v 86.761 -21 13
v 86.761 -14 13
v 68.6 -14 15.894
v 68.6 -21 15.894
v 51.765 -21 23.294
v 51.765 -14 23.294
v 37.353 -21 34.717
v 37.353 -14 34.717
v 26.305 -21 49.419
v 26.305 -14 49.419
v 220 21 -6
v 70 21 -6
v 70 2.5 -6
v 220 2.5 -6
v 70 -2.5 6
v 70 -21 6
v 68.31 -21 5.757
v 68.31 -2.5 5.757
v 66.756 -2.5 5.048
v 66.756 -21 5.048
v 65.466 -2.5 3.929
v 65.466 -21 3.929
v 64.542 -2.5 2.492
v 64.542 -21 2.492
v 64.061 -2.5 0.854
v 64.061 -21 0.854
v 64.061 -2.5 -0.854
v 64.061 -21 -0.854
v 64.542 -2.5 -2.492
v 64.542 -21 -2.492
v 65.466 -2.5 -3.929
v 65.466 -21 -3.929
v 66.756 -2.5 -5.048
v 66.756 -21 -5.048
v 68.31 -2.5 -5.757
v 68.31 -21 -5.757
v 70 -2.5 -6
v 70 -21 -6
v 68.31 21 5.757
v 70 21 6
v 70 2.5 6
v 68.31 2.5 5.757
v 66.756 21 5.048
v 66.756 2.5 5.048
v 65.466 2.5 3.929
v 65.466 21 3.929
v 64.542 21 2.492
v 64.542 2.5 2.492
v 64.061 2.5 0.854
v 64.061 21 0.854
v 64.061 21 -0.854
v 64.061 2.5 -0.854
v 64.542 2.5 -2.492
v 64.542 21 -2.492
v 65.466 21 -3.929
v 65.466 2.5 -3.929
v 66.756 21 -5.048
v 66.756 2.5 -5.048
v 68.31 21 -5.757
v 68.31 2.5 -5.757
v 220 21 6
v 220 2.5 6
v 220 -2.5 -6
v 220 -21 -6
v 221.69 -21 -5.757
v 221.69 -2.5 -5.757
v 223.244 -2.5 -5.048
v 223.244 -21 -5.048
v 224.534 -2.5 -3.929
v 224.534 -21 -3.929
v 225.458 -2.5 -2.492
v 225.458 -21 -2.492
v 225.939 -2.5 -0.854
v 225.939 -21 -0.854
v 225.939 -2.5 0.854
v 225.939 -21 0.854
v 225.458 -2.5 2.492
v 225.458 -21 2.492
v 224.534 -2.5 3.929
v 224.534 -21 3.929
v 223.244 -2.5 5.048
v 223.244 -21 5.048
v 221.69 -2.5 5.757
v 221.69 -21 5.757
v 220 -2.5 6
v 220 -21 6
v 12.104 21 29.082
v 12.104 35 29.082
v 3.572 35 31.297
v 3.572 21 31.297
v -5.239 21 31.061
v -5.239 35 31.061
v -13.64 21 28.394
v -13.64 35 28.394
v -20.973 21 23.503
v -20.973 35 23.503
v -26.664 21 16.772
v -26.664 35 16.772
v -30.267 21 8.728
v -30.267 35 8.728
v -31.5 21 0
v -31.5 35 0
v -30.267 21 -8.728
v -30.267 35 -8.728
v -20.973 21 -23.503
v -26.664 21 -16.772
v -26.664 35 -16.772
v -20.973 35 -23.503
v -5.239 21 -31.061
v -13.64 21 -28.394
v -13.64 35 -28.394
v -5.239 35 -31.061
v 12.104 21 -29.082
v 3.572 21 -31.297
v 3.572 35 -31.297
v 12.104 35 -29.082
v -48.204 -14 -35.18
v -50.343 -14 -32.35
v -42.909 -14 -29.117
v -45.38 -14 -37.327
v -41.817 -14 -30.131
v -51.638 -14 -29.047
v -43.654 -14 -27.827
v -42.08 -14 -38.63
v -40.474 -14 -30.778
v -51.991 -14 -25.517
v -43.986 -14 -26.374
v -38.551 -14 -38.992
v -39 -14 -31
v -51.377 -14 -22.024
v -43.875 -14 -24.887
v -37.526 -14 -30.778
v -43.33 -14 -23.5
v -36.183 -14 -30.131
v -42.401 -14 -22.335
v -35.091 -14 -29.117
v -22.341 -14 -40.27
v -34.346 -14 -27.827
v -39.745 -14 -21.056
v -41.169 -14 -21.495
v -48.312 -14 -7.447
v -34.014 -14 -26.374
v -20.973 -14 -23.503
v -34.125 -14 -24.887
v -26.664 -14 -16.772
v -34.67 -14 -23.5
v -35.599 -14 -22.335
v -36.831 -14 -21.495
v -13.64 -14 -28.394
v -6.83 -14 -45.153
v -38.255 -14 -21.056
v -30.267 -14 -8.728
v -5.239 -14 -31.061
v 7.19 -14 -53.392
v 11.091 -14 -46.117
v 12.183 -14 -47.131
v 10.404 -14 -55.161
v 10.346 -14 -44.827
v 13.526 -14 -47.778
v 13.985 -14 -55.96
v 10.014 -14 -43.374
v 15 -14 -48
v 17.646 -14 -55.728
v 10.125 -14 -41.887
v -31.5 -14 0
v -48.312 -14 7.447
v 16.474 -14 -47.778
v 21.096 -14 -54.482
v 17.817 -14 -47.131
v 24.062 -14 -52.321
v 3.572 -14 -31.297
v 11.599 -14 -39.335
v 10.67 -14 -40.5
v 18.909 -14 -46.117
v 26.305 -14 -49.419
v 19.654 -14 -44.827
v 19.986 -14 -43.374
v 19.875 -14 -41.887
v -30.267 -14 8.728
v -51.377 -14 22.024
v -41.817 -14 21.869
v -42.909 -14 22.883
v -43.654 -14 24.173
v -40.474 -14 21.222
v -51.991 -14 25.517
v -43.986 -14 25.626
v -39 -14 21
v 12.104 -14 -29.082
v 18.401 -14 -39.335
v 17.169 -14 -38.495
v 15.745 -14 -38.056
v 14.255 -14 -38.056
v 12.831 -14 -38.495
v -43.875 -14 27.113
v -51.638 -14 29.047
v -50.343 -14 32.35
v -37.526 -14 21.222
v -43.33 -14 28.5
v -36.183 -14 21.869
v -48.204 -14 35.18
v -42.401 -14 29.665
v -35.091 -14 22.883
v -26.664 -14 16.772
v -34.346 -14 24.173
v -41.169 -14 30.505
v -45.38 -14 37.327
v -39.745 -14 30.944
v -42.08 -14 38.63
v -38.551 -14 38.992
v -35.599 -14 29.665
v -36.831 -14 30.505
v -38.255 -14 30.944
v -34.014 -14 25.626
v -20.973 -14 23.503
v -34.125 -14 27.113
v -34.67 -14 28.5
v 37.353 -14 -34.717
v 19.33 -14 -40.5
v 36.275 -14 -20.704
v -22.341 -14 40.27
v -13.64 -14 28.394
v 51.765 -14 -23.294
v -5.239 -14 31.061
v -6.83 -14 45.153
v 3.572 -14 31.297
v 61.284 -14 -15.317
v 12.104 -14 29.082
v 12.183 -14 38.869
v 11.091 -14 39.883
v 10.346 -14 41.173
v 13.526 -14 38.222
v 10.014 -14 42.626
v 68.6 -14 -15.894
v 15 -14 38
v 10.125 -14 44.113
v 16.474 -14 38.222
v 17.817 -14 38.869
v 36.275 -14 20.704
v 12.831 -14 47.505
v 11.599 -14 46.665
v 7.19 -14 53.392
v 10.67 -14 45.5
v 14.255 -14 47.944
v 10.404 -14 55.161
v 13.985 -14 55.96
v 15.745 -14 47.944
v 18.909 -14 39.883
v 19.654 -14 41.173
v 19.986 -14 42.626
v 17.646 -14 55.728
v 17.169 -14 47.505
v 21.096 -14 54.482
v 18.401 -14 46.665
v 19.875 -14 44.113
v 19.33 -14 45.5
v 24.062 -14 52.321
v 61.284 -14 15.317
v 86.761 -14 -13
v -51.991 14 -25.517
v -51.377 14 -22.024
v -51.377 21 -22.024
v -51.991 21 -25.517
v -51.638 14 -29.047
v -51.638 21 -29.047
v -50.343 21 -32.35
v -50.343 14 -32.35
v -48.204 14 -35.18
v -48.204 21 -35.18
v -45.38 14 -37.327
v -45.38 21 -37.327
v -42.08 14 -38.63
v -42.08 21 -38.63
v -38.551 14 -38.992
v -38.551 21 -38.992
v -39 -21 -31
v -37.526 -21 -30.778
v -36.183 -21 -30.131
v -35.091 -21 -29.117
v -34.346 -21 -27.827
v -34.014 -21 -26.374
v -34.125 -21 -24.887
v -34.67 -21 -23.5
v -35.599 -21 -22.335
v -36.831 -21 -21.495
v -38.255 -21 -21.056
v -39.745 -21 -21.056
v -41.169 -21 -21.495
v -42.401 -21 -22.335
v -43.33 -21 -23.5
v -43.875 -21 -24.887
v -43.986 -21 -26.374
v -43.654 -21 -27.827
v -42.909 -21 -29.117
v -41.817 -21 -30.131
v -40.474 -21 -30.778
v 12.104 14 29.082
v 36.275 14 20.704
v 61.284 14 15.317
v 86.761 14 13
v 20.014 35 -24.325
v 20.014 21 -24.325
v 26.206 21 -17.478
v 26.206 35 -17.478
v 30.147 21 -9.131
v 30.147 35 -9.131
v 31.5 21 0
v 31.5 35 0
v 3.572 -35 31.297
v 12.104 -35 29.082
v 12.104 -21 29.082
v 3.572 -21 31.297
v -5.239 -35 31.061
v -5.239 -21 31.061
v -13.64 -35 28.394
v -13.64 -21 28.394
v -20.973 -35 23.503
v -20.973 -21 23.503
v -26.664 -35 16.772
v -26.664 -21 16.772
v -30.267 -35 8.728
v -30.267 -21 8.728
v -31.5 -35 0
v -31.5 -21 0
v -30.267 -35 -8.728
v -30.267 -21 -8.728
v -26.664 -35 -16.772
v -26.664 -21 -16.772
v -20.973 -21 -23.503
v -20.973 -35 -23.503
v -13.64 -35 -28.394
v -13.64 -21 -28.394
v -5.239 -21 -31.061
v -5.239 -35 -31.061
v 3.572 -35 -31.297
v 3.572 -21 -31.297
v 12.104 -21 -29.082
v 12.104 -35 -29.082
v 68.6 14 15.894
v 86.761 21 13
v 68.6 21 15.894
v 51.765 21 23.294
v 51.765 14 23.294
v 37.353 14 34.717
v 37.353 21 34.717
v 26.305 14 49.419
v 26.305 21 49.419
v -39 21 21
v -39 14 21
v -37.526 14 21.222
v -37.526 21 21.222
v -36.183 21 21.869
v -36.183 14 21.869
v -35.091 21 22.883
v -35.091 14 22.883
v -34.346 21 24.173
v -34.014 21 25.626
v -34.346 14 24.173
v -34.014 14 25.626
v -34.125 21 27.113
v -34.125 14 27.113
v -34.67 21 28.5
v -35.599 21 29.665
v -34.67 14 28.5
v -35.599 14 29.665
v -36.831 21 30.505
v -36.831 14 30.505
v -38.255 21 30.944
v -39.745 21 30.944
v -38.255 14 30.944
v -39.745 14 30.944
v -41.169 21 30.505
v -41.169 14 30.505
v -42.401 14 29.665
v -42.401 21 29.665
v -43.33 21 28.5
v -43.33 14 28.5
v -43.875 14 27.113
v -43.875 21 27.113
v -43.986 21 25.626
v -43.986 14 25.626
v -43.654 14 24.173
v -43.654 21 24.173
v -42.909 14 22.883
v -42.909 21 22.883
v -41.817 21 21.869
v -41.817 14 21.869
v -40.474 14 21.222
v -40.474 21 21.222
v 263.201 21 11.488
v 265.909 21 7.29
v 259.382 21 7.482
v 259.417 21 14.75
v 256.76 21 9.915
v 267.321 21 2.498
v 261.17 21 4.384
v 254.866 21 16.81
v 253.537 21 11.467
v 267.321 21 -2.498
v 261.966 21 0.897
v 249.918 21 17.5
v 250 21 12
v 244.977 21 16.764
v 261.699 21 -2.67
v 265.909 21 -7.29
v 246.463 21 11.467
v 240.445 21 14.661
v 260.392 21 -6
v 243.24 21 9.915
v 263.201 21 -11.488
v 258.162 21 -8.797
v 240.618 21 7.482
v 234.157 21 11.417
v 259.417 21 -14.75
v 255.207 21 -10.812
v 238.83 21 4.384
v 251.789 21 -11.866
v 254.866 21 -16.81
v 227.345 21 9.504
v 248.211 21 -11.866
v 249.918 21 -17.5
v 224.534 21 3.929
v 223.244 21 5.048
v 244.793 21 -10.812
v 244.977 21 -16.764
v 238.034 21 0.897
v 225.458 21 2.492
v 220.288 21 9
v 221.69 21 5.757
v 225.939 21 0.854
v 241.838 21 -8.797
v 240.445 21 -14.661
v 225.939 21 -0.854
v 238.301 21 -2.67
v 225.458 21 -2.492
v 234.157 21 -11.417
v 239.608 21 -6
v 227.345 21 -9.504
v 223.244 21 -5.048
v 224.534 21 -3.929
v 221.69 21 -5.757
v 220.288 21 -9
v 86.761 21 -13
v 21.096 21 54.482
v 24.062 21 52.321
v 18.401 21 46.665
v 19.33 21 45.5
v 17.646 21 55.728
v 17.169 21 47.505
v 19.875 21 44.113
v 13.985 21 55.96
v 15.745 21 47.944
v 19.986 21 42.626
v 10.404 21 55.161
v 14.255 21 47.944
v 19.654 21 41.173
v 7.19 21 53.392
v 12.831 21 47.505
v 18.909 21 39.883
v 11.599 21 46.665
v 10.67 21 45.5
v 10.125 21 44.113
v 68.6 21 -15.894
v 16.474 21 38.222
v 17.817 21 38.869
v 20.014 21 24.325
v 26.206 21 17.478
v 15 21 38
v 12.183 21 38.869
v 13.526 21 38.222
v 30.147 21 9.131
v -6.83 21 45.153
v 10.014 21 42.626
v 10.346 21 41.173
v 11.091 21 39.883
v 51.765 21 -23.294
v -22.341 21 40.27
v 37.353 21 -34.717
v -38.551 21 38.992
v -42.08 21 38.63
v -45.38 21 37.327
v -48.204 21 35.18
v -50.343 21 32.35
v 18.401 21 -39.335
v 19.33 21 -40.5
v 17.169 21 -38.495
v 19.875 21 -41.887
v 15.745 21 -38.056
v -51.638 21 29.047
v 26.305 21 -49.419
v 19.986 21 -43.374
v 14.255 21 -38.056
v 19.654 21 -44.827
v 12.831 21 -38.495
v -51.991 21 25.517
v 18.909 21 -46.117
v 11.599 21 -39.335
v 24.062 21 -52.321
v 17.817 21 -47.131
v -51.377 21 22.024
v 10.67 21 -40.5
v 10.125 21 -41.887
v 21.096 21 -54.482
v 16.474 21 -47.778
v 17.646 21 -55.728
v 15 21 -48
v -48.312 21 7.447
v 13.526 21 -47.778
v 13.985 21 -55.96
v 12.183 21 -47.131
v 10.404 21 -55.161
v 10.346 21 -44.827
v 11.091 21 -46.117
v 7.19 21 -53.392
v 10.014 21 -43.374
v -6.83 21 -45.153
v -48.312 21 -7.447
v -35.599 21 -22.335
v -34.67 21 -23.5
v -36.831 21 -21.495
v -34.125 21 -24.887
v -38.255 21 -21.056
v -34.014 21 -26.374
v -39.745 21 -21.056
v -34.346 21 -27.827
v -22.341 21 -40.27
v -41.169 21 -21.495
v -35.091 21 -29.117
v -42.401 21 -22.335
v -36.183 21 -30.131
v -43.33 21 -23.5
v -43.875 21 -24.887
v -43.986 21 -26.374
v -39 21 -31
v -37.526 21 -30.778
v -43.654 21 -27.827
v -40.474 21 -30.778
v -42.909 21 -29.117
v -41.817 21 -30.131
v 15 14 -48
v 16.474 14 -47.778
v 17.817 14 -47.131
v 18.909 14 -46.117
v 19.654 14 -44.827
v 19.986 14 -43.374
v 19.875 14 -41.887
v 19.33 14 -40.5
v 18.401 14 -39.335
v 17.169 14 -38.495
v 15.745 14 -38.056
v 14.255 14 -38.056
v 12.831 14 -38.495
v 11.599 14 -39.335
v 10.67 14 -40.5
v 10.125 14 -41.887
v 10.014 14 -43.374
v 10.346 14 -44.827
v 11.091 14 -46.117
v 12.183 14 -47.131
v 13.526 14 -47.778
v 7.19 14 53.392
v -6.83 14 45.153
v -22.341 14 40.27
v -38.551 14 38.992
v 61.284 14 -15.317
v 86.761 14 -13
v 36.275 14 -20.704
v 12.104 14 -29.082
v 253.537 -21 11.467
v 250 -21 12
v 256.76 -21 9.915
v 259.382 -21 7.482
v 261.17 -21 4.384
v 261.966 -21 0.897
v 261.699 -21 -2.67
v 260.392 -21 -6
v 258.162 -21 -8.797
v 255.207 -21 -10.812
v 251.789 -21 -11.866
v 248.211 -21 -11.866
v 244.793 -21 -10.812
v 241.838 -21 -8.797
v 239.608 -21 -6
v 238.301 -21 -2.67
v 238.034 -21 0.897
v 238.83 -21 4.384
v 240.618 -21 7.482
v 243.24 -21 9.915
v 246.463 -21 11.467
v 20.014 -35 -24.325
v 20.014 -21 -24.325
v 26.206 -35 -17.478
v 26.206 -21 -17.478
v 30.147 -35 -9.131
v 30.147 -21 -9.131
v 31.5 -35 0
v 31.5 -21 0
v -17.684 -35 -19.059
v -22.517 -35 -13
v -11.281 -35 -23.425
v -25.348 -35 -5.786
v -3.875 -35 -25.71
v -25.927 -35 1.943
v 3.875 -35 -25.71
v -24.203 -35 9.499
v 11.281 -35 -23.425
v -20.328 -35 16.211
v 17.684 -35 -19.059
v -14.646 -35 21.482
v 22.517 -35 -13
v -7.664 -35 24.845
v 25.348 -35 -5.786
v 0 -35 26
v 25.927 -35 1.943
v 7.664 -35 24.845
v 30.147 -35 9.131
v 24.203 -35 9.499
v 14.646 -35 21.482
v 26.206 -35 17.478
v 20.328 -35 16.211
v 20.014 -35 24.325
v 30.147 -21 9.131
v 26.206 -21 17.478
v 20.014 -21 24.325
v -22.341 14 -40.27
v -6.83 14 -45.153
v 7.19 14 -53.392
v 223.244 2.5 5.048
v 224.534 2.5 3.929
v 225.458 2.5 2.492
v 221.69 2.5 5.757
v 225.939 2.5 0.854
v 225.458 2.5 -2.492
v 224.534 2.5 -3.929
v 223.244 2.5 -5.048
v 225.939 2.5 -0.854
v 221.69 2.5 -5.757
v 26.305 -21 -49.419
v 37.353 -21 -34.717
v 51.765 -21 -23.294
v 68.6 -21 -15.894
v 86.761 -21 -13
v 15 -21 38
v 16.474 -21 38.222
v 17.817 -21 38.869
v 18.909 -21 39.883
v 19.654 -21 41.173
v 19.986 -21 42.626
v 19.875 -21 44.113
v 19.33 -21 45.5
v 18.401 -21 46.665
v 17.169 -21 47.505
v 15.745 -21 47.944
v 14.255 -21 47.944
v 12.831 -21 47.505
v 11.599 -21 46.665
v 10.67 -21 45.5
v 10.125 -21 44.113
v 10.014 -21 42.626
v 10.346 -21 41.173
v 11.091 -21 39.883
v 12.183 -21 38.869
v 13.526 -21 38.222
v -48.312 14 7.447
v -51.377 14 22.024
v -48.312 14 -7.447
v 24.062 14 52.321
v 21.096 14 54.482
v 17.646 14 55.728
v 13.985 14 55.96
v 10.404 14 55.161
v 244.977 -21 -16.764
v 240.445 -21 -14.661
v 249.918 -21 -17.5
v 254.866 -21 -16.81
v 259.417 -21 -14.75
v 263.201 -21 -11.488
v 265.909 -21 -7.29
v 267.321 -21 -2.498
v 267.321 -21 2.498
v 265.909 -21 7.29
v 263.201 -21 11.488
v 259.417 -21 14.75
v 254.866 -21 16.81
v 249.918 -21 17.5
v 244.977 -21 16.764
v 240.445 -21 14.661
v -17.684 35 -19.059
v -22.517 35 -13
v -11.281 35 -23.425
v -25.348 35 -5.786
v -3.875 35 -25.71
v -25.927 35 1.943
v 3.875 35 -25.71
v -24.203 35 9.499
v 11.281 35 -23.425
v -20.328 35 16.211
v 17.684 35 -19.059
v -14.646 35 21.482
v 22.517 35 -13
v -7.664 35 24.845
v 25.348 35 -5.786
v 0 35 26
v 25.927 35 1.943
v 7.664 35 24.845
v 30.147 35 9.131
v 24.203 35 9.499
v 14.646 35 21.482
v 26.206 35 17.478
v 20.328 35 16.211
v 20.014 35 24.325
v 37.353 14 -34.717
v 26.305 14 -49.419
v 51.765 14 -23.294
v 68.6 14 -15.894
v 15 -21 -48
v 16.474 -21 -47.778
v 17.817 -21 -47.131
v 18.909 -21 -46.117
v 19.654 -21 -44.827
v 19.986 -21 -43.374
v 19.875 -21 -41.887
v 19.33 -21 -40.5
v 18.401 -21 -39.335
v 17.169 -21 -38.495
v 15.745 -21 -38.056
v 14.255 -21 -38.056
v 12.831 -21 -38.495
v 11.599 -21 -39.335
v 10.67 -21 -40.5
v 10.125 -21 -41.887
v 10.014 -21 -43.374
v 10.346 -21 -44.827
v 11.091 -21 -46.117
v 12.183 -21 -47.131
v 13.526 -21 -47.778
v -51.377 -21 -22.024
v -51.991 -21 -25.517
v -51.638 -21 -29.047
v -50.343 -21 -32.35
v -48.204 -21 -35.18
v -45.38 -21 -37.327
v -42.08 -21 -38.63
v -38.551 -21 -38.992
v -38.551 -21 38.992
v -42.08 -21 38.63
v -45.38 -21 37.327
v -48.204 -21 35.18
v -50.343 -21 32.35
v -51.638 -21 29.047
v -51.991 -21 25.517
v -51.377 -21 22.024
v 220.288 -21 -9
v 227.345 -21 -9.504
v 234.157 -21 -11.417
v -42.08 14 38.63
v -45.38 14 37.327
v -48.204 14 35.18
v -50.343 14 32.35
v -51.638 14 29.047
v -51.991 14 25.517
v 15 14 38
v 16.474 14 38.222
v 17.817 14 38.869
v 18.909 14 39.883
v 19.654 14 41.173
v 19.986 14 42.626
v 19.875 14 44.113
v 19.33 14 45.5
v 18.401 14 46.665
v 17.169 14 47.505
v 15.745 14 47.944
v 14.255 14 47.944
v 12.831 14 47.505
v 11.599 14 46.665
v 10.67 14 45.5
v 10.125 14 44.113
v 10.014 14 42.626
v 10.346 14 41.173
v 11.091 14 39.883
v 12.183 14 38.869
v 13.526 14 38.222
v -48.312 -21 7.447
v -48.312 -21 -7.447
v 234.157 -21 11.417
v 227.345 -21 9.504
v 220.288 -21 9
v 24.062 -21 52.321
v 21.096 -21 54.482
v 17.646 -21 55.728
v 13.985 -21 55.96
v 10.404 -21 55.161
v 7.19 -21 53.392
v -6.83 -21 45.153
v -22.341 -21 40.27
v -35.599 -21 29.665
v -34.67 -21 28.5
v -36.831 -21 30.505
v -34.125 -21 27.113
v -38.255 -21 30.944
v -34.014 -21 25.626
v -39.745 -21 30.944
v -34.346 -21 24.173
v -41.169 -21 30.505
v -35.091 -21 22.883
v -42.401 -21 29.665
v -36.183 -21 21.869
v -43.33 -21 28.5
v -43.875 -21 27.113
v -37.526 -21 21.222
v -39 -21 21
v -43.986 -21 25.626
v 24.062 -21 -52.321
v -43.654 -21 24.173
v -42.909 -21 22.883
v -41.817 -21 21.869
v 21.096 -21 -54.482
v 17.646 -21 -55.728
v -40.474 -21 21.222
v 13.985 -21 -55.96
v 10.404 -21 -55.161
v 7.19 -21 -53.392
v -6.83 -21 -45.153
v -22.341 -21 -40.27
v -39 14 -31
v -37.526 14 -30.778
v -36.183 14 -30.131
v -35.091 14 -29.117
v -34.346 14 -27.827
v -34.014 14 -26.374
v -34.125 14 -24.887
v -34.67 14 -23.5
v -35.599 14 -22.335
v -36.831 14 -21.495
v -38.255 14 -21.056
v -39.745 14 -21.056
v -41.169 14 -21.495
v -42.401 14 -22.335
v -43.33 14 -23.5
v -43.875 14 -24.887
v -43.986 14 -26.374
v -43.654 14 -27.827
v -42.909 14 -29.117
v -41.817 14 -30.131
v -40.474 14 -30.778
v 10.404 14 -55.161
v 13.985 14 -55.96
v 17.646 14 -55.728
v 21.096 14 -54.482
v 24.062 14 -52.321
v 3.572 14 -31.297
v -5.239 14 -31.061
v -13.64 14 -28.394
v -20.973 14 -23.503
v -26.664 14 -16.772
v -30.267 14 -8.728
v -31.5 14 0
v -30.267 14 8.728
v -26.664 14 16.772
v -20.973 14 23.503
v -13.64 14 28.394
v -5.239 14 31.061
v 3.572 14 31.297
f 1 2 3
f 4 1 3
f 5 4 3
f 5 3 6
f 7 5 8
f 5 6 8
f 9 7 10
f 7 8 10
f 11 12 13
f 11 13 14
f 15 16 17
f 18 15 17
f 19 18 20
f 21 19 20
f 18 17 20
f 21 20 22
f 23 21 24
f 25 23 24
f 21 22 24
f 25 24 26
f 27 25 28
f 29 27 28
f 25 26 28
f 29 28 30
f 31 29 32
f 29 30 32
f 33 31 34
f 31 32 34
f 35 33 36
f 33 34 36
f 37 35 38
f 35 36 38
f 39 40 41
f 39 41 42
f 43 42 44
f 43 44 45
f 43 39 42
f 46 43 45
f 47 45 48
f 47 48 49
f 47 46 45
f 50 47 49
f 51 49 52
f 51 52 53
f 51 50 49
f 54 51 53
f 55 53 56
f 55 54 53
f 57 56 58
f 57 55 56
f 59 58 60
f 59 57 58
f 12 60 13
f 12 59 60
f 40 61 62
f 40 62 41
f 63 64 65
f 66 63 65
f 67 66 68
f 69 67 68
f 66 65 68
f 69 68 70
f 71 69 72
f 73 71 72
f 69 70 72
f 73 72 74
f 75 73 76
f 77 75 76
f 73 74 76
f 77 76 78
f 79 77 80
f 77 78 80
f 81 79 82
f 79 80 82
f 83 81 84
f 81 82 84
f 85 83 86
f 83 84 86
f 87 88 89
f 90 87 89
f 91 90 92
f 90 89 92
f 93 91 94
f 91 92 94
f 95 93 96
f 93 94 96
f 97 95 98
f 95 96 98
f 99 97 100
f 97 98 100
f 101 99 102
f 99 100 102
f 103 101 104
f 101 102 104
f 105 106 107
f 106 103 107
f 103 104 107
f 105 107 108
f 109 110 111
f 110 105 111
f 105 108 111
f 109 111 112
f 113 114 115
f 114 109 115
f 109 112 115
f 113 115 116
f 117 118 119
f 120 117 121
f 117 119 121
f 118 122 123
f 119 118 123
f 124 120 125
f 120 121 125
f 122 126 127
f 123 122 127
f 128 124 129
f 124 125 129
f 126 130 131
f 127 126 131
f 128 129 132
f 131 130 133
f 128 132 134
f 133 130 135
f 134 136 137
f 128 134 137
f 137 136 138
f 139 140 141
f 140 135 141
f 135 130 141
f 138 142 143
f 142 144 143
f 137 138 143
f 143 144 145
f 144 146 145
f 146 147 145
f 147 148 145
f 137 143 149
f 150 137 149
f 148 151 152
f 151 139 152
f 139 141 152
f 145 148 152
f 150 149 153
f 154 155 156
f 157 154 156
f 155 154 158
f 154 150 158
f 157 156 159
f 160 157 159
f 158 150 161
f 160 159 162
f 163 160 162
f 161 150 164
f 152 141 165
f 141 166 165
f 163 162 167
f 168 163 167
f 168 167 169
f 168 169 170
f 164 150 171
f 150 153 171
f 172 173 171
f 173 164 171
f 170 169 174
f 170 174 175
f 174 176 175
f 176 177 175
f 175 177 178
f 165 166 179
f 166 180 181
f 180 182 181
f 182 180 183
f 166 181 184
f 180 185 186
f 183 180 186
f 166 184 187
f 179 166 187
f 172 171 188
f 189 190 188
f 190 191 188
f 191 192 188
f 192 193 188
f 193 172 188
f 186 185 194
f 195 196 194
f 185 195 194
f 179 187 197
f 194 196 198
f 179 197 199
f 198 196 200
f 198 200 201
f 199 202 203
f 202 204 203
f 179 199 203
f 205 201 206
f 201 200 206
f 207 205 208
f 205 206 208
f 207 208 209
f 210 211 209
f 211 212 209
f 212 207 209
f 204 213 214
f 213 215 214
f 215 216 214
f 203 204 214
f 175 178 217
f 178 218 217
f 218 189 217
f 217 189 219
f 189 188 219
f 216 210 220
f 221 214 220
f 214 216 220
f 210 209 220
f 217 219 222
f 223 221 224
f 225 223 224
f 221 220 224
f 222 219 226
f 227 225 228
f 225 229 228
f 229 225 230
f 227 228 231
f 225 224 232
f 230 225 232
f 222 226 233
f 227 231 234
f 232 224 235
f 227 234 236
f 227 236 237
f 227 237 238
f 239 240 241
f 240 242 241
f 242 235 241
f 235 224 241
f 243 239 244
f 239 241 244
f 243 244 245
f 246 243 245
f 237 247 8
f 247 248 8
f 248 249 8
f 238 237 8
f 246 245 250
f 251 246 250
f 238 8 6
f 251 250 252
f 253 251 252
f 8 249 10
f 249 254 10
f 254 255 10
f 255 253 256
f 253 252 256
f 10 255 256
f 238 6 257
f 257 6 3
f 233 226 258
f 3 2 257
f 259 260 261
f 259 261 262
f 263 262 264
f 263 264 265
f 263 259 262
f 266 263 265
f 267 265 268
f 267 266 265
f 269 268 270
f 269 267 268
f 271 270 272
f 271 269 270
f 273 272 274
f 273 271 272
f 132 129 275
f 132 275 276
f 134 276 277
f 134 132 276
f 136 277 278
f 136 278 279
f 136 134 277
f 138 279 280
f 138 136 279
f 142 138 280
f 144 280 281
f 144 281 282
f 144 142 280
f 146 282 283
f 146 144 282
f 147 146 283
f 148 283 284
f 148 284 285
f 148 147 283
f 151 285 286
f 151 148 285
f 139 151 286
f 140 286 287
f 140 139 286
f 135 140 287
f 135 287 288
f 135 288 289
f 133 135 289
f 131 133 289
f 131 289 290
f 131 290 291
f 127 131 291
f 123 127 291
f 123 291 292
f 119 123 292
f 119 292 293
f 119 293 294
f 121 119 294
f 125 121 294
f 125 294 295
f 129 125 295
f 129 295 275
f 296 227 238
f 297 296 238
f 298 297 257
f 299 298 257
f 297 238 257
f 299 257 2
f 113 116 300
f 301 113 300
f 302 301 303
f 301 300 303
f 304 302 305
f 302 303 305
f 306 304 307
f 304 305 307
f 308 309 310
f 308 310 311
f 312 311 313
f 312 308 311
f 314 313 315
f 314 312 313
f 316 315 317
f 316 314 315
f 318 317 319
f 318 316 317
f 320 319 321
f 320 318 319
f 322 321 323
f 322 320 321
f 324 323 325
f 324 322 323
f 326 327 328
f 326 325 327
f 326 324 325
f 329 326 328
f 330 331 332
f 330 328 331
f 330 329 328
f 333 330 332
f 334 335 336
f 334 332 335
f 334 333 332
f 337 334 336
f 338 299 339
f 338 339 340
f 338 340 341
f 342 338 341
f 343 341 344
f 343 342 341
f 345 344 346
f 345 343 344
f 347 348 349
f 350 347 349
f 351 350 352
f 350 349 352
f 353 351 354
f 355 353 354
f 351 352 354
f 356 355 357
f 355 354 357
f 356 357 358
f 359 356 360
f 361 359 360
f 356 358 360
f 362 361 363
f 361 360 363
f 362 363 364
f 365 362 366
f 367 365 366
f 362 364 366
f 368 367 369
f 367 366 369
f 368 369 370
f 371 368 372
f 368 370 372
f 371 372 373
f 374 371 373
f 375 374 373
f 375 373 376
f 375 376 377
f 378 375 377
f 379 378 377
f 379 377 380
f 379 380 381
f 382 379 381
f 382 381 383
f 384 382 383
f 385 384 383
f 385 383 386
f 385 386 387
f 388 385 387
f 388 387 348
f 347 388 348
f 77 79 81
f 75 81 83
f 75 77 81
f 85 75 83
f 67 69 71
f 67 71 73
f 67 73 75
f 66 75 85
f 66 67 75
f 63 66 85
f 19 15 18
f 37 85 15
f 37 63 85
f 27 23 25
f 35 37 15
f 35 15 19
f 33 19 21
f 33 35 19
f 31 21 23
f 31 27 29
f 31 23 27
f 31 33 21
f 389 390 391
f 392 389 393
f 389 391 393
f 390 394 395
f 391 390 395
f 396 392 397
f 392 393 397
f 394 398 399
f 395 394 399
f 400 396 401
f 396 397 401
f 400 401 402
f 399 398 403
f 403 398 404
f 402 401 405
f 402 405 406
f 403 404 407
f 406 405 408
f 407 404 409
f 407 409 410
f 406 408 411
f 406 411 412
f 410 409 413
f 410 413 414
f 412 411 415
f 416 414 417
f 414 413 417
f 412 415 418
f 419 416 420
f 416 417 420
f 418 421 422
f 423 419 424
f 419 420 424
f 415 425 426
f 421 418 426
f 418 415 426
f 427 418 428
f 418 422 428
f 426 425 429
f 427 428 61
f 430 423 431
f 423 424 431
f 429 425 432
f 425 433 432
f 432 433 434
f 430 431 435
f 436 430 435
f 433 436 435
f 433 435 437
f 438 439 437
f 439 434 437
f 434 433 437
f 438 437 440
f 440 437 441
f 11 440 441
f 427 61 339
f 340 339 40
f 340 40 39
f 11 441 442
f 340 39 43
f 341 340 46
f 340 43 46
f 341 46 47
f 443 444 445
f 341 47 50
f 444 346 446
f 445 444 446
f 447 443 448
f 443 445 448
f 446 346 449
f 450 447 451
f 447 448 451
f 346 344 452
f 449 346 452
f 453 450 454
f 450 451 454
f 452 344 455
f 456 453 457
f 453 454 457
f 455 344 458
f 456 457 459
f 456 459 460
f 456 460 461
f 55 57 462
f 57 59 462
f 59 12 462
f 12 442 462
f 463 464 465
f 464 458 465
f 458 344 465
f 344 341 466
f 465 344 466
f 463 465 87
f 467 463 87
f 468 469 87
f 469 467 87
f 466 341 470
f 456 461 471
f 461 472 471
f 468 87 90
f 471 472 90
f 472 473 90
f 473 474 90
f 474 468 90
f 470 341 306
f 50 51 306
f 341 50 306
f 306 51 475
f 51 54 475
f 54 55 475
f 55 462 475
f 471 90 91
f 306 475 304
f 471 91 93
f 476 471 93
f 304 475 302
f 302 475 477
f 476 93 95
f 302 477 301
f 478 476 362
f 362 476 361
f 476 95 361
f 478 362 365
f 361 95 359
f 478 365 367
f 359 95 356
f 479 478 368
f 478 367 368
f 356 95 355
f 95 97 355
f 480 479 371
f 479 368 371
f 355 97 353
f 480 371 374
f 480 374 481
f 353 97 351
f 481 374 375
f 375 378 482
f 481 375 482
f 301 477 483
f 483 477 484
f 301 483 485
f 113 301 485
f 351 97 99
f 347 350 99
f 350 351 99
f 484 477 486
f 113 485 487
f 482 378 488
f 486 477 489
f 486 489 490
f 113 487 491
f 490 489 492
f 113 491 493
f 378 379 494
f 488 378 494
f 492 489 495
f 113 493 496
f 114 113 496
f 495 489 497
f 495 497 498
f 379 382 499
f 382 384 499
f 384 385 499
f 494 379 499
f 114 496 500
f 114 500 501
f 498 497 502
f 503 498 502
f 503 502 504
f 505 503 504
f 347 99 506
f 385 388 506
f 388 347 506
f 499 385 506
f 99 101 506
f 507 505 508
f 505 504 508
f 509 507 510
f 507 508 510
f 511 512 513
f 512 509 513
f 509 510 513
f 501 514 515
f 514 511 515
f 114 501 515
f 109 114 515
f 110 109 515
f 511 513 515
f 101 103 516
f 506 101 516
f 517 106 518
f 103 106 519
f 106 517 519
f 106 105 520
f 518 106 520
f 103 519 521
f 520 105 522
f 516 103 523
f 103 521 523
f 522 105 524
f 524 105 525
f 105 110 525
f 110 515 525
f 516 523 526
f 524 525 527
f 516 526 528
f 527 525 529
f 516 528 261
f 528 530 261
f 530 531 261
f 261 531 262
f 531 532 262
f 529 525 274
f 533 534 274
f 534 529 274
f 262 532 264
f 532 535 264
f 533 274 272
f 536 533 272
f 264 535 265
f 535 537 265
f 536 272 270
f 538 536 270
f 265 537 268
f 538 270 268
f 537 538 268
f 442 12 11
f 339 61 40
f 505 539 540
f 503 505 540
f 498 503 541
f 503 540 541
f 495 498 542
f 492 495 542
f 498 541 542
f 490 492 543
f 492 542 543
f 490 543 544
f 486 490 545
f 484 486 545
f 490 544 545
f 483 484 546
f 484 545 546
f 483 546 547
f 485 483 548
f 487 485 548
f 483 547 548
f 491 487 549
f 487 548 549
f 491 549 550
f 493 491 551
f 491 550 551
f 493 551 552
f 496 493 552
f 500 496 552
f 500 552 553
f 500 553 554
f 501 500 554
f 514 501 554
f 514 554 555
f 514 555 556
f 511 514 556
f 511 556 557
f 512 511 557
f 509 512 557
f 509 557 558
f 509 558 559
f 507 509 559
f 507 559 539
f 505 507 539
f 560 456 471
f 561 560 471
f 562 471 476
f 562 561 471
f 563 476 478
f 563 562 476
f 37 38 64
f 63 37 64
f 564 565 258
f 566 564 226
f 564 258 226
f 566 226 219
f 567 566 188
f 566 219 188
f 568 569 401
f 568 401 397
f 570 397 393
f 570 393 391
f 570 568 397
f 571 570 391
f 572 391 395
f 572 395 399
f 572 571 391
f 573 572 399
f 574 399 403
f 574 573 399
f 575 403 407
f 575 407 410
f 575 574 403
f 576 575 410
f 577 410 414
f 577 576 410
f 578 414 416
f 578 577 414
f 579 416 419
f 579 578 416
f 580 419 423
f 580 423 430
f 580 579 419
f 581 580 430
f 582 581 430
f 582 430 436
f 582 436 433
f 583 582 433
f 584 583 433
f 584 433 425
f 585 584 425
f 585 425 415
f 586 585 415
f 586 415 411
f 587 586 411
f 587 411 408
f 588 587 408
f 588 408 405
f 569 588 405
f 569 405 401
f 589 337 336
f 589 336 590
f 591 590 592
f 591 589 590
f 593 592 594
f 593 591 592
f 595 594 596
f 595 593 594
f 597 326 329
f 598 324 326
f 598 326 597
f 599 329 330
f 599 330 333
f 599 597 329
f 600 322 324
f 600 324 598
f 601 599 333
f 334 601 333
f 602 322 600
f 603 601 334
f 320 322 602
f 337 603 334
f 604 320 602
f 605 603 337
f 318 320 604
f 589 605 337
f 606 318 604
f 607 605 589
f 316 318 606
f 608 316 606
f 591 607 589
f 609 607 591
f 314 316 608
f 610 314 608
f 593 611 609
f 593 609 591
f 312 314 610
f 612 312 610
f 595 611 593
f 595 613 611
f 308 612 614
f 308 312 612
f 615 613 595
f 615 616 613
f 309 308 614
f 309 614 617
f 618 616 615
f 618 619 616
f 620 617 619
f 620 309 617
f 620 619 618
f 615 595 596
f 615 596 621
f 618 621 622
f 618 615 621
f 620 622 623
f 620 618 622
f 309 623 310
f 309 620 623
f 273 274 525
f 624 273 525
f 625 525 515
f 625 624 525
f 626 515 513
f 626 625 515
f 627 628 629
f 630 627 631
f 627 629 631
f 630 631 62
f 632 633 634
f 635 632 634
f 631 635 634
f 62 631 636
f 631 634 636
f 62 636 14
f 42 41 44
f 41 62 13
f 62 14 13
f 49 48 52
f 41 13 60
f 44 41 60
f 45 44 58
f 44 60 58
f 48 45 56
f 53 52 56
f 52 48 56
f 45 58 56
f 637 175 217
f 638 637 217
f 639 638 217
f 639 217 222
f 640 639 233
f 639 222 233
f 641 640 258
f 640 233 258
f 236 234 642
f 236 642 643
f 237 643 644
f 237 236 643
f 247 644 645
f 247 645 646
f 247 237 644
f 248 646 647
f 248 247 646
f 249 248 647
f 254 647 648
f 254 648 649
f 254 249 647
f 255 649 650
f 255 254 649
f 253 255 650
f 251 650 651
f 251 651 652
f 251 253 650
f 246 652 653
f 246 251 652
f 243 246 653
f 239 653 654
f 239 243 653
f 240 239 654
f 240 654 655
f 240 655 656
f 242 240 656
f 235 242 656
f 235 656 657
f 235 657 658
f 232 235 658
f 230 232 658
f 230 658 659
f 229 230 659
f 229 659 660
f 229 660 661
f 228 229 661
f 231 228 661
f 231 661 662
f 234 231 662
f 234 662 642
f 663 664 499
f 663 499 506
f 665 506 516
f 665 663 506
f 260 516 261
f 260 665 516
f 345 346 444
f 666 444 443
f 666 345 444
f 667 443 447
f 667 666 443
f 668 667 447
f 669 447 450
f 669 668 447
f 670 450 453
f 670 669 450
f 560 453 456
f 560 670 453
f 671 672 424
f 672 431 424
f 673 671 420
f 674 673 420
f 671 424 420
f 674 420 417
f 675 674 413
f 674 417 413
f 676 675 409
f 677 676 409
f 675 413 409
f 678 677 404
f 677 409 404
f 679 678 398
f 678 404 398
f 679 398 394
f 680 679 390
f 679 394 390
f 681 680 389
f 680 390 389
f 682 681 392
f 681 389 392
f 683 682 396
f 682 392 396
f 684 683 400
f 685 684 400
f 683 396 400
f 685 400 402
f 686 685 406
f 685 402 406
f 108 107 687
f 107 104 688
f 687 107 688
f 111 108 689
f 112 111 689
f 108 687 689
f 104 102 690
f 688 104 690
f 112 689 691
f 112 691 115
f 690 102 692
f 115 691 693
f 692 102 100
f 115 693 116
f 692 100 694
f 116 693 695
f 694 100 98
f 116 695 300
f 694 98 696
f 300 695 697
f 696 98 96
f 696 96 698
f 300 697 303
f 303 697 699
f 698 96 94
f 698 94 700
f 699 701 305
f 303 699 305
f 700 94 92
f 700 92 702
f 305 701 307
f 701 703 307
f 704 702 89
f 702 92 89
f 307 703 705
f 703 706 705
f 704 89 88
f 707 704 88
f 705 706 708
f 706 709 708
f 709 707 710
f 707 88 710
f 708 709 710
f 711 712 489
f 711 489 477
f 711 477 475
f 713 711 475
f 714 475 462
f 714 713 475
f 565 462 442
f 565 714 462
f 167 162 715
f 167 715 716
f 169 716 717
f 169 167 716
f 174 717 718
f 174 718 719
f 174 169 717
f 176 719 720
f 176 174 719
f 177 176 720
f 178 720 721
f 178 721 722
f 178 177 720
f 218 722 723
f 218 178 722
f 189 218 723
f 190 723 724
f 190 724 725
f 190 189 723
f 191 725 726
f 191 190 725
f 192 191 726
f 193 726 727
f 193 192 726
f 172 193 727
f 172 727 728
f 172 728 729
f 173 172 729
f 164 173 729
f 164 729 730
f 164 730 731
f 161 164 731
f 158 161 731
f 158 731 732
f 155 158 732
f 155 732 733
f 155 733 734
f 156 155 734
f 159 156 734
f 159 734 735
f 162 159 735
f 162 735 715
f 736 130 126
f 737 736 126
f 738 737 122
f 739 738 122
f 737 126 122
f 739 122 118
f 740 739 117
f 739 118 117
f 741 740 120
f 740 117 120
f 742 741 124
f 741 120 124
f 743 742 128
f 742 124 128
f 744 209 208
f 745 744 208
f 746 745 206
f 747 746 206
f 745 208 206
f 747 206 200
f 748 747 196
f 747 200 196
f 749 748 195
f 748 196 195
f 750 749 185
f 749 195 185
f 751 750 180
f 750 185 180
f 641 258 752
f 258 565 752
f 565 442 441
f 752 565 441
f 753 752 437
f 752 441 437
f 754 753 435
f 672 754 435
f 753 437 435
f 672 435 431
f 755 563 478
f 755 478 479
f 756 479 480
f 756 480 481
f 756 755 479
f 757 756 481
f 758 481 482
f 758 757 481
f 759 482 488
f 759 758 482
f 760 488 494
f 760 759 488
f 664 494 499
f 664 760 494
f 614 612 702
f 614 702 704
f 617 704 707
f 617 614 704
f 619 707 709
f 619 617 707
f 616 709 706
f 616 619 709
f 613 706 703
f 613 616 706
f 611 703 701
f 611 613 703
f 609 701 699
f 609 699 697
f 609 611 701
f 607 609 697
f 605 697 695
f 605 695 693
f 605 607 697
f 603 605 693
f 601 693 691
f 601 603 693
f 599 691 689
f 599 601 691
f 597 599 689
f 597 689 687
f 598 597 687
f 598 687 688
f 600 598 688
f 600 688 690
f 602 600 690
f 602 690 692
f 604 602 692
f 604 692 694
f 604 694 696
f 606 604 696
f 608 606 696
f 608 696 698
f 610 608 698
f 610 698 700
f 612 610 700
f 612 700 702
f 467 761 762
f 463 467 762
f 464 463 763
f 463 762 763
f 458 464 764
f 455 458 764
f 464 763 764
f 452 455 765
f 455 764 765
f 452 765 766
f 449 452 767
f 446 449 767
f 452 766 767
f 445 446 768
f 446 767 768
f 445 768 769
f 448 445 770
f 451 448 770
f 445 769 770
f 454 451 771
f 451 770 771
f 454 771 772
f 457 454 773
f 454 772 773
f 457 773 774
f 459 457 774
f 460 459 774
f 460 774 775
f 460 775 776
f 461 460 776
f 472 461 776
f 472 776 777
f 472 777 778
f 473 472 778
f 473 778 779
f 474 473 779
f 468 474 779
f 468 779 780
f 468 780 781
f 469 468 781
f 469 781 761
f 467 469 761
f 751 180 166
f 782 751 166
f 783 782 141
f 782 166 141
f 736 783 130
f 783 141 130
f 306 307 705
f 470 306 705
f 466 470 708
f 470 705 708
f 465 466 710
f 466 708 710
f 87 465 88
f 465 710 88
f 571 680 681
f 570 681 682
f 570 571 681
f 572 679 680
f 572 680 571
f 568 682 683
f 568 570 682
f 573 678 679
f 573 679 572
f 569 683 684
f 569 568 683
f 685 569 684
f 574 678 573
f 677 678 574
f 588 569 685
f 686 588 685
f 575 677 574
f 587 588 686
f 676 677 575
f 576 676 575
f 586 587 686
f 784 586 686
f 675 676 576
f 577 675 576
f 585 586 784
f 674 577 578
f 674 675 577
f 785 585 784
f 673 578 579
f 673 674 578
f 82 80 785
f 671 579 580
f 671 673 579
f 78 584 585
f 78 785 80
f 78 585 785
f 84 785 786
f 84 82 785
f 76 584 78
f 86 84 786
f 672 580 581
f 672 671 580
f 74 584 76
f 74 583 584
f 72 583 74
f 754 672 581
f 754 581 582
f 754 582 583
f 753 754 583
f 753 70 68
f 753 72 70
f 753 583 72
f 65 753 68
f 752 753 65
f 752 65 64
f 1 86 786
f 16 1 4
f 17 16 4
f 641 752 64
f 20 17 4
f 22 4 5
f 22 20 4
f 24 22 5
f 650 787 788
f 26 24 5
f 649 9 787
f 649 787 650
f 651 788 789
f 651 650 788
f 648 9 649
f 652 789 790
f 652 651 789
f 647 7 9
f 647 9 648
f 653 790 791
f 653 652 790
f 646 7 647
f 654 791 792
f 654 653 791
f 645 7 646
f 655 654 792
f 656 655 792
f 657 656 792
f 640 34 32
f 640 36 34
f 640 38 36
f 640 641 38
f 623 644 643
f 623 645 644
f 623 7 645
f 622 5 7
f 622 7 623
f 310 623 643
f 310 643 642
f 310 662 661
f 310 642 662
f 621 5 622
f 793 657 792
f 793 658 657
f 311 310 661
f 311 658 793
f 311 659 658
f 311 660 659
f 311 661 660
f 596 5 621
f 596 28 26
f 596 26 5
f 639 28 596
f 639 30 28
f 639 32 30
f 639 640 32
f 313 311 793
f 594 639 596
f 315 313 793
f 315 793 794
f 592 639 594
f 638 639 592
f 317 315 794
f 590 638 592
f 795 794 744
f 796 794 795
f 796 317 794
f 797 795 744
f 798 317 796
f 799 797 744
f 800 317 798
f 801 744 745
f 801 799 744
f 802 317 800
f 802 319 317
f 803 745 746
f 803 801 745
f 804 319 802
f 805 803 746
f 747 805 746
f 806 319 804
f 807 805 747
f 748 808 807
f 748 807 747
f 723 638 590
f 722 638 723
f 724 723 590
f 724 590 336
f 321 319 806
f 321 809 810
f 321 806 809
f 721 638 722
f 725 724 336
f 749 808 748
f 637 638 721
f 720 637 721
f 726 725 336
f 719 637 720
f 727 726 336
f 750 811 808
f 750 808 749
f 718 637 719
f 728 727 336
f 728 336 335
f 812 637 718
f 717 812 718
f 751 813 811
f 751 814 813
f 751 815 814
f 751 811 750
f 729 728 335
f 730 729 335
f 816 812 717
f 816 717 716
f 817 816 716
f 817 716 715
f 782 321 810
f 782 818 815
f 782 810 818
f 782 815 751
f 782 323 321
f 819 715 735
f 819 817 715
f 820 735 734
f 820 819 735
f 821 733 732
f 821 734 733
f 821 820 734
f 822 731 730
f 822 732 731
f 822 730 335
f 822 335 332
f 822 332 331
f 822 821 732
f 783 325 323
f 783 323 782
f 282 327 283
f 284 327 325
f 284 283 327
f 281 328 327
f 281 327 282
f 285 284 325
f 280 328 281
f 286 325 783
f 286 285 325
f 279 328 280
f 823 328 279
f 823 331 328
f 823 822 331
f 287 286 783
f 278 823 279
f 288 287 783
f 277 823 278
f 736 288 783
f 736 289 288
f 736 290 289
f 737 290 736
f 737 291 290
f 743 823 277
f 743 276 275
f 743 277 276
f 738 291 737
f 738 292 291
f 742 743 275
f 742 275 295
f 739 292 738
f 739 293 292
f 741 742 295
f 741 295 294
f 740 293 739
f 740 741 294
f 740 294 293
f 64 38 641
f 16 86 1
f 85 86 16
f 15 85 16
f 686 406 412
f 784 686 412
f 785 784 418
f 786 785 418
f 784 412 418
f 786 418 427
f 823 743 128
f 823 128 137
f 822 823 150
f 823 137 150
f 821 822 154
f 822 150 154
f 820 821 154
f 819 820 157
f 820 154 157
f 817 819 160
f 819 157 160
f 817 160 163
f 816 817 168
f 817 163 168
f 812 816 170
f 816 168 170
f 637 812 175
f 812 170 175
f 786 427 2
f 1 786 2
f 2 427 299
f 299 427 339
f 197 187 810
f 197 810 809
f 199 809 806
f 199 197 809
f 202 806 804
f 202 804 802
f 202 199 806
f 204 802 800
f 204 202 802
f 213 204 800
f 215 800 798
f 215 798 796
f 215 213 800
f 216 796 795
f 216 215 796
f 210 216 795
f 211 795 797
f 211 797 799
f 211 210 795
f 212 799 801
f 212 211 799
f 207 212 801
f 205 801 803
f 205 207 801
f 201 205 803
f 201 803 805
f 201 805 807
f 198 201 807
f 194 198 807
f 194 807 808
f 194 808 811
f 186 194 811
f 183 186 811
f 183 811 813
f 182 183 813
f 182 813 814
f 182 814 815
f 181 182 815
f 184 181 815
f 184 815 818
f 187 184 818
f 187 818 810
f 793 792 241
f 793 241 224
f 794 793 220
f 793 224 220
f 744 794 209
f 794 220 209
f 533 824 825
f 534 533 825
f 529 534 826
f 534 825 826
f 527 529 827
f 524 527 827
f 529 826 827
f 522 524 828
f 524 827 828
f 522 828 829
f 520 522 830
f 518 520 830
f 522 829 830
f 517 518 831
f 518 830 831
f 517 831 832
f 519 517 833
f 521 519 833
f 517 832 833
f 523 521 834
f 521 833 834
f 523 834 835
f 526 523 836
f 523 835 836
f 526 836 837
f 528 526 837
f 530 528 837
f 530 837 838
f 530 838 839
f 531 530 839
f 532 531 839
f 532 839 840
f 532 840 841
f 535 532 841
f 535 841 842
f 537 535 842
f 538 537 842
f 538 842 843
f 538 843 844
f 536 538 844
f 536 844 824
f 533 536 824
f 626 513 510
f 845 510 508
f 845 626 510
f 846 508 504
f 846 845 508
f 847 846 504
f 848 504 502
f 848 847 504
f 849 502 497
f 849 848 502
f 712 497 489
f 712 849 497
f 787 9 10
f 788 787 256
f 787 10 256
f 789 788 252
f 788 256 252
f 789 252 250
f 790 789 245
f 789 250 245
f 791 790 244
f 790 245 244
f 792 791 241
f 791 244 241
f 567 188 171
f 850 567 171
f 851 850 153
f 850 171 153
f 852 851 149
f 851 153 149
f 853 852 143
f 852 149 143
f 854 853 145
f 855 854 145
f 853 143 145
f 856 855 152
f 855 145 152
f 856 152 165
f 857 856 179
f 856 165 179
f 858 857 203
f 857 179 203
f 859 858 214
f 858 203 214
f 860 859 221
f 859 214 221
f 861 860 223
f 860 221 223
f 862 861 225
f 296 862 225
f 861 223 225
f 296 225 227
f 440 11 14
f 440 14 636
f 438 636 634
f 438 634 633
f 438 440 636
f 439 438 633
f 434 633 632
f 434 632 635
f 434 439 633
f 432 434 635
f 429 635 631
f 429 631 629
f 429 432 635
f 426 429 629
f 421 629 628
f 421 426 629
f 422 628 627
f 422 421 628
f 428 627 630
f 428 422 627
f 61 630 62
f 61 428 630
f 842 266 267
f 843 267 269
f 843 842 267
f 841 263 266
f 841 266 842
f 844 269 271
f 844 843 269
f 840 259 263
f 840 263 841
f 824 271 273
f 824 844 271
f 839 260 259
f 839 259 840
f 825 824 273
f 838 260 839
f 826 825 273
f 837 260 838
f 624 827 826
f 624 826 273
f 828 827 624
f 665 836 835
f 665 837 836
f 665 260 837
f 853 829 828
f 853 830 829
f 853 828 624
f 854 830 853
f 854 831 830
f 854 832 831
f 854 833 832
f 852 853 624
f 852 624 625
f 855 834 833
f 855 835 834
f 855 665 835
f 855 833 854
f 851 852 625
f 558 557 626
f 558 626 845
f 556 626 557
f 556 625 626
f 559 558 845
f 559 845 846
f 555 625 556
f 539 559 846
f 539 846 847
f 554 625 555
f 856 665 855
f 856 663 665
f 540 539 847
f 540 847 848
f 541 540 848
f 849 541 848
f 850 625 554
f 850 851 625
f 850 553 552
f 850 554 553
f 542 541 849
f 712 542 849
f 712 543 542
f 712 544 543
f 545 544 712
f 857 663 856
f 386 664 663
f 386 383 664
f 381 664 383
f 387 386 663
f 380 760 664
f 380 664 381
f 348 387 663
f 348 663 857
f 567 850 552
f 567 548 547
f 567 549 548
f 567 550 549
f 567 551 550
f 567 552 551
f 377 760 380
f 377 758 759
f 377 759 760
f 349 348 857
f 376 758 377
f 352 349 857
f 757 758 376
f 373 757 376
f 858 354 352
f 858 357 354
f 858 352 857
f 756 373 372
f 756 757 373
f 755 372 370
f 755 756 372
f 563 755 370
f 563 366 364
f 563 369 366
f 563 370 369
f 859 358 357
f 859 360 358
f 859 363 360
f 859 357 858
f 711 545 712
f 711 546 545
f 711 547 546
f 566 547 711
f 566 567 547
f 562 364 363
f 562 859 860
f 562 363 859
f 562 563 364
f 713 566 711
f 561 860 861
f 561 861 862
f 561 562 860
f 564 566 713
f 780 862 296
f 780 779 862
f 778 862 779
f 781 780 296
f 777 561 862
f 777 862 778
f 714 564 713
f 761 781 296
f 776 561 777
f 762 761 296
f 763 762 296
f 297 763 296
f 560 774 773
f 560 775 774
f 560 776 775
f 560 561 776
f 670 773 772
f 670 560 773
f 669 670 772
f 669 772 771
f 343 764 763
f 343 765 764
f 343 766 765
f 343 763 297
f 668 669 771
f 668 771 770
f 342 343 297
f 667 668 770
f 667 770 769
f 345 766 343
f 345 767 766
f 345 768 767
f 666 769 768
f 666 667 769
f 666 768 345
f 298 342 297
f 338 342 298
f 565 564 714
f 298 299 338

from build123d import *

# Parameters (mm, degrees)
BOSS_EXTRUDE1_DEPTH   = 21
CUT_EXTRUDE1_START    = -14
CUT_EXTRUDE1_DEPTH    = 14
BOSS_EXTRUDE2_START   = -35
BOSS_EXTRUDE2_DEPTH   = 35
SKETCH5_R             = 26
SKETCH5_R_2           = 12
CUT_EXTRUDE2_DEPTH    = 276.530851267
CUT_EXTRUDE3_DEPTH    = 18.5
F_1_0MM_DOWEL_HOLE1_D = 10


# Read off the part's stored shape, not the designer's step: Cut-Extrude1
with BuildPart() as part:
    # Sketch1 → Boss-Extrude1 (new body)
    with BuildSketch(Plane(origin=(0, 0, 0), x_dir=(1, 0, 0), z_dir=(0, 1, 0))):
        with BuildLine():
            Line((86.761016473, 13), (220.287888894, 9))
            ThreePointArc((220.287888894, 9), (230.799852276, 10.288111331), (240.44529895, 14.661435395))
            ThreePointArc((240.44529895, 14.661435395), (267.5, 0), (240.44529895, -14.661435395))
            ThreePointArc((240.44529895, -14.661435395), (230.799852276, -10.288111331), (220.287888894, -9))
            Line((220.287888894, -9), (86.761016473, -13))
            ThreePointArc((86.761016473, -13), (51.764556155, -23.293555937), (26.304940485, -49.418591795))
            ThreePointArc((26.304940485, -49.418591795), (17.645869205, -55.727897554), (7.189691393, -53.392260556))
            ThreePointArc((7.189691393, -53.392260556), (-14.44681941, -42.272249892), (-38.551485077, -38.992260556))
            ThreePointArc((-38.551485077, -38.992260556), (-49.370923708, -33.838618593), (-51.376901133, -22.023529412))
            ThreePointArc((-51.376901133, -22.023529412), (-47.925892025, 0), (-51.376901133, 22.023529412))
            ThreePointArc((-51.376901133, 22.023529412), (-49.370923708, 33.838618593), (-38.551485077, 38.992260556))
            ThreePointArc((-38.551485077, 38.992260556), (-14.44681941, 42.272249892), (7.189691393, 53.392260556))
            ThreePointArc((7.189691393, 53.392260556), (17.645869205, 55.727897554), (26.304940485, 49.418591795))
            ThreePointArc((26.304940485, 49.418591795), (51.764556155, 23.293555937), (86.761016473, 13))
        make_face()
    extrude(amount=BOSS_EXTRUDE1_DEPTH)

    # Cut-Extrude1 outline → Cut-Extrude1 (cut)
    with BuildSketch(Plane.XZ.offset(CUT_EXTRUDE1_START)):
        with BuildLine():
            ThreePointArc((86.761016473, -13), (48.697663607, -17.630477543), (12.103585769, -29.081836454))
            ThreePointArc((12.103585769, -29.081836454), (-31.5, 0), (12.103585769, 29.081836454))
            ThreePointArc((12.103585769, 29.081836454), (48.697663607, 17.630477543), (86.761016473, 13))
            ThreePointArc((86.761016473, 13), (51.764556155, 23.293555937), (26.304940485, 49.418591795))
            ThreePointArc((26.304940485, 49.418591795), (17.645869204, 55.727897554), (7.189691393, 53.392260556))
            ThreePointArc((7.189691393, 53.392260556), (-14.446819411, 42.272249892), (-38.551485077, 38.992260556))
            ThreePointArc((-38.551485077, 38.992260556), (-49.370923708, 33.838618593), (-51.376901133, 22.023529412))
            ThreePointArc((-51.376901133, 22.023529412), (-47.925892025, 0), (-51.376901133, -22.023529412))
            ThreePointArc((-51.376901133, -22.023529412), (-49.370923708, -33.838618593), (-38.551485077, -38.992260556))
            ThreePointArc((-38.551485077, -38.992260556), (-14.446819411, -42.272249892), (7.189691393, -53.392260556))
            ThreePointArc((7.189691393, -53.392260556), (17.645869204, -55.727897554), (26.304940485, -49.418591795))
            ThreePointArc((26.304940485, -49.418591795), (51.764556155, -23.293555937), (86.761016473, -13))
        make_face()
    extrude(amount=CUT_EXTRUDE1_DEPTH, mode=Mode.SUBTRACT)

    # Sketch3 → Boss-Extrude2 (add)
    with BuildSketch(Plane.XZ.offset(BOSS_EXTRUDE2_START)):
        with BuildLine():
            ThreePointArc((12.103585769, -29.081836454), (26.20603892, -17.47837304), (31.5, 0))
            ThreePointArc((31.5, 0), (26.20603892, 17.47837304), (12.103585769, 29.081836454))
            ThreePointArc((12.103585769, 29.081836454), (-31.5, 0), (12.103585769, -29.081836454))
        make_face()
    extrude(amount=BOSS_EXTRUDE2_DEPTH)

    # Sketch5 → Cut-Extrude2 (cut, through all)
    with BuildSketch(Plane(origin=(0, 35, 0), x_dir=(1, 0, 0), z_dir=(0, 1, 0))):
        with Locations(Location((0, 0, 0), (0, 0, 270))):
            Circle(SKETCH5_R)
        with Locations(Location((250, 0, 0), (0, 0, 270))):
            Circle(SKETCH5_R_2)
    extrude(amount=-CUT_EXTRUDE2_DEPTH, mode=Mode.SUBTRACT)

    # Sketch6 → Cut-Extrude3 (cut)
    with BuildSketch(Plane(origin=(0, 21, 0), x_dir=(1, 0, 0), z_dir=(0, 1, 0))):
        with BuildLine():
            Line((70, 6), (220, 6))
            ThreePointArc((220, 6), (226, 0), (220, -6))
            Line((220, -6), (70, -6))
            ThreePointArc((70, -6), (64, 0), (70, 6))
        make_face()
    extrude(amount=-CUT_EXTRUDE3_DEPTH, mode=Mode.SUBTRACT)

    # Ø1.0mm Dowel Hole1 (through all)
    with Locations(Plane(origin=(15, 21, 43), x_dir=(0, 0, 1), z_dir=(0, 1, 0))):
        with Locations((0, 0)):
            f_1_0mm_dowel_hole1 = Hole(F_1_0MM_DOWEL_HOLE1_D / 2)

    # Sketch-Pattern1: Ø1.0mm Dowel Hole1 at 3 more places
    with Locations((-54, 0, -69), (-54, 0, -17), (0, 0, -86)):
        add(f_1_0mm_dowel_hole1, mode=Mode.SUBTRACT)

    # Mirror1: part across plane


with BuildPart() as part_1:
    add(part.part)
    add(part.part.mirror(Plane(origin=(-39, 0, -26), x_dir=(0, 0, 1), z_dir=(0, -1, 0))))


solid = part_1.part
